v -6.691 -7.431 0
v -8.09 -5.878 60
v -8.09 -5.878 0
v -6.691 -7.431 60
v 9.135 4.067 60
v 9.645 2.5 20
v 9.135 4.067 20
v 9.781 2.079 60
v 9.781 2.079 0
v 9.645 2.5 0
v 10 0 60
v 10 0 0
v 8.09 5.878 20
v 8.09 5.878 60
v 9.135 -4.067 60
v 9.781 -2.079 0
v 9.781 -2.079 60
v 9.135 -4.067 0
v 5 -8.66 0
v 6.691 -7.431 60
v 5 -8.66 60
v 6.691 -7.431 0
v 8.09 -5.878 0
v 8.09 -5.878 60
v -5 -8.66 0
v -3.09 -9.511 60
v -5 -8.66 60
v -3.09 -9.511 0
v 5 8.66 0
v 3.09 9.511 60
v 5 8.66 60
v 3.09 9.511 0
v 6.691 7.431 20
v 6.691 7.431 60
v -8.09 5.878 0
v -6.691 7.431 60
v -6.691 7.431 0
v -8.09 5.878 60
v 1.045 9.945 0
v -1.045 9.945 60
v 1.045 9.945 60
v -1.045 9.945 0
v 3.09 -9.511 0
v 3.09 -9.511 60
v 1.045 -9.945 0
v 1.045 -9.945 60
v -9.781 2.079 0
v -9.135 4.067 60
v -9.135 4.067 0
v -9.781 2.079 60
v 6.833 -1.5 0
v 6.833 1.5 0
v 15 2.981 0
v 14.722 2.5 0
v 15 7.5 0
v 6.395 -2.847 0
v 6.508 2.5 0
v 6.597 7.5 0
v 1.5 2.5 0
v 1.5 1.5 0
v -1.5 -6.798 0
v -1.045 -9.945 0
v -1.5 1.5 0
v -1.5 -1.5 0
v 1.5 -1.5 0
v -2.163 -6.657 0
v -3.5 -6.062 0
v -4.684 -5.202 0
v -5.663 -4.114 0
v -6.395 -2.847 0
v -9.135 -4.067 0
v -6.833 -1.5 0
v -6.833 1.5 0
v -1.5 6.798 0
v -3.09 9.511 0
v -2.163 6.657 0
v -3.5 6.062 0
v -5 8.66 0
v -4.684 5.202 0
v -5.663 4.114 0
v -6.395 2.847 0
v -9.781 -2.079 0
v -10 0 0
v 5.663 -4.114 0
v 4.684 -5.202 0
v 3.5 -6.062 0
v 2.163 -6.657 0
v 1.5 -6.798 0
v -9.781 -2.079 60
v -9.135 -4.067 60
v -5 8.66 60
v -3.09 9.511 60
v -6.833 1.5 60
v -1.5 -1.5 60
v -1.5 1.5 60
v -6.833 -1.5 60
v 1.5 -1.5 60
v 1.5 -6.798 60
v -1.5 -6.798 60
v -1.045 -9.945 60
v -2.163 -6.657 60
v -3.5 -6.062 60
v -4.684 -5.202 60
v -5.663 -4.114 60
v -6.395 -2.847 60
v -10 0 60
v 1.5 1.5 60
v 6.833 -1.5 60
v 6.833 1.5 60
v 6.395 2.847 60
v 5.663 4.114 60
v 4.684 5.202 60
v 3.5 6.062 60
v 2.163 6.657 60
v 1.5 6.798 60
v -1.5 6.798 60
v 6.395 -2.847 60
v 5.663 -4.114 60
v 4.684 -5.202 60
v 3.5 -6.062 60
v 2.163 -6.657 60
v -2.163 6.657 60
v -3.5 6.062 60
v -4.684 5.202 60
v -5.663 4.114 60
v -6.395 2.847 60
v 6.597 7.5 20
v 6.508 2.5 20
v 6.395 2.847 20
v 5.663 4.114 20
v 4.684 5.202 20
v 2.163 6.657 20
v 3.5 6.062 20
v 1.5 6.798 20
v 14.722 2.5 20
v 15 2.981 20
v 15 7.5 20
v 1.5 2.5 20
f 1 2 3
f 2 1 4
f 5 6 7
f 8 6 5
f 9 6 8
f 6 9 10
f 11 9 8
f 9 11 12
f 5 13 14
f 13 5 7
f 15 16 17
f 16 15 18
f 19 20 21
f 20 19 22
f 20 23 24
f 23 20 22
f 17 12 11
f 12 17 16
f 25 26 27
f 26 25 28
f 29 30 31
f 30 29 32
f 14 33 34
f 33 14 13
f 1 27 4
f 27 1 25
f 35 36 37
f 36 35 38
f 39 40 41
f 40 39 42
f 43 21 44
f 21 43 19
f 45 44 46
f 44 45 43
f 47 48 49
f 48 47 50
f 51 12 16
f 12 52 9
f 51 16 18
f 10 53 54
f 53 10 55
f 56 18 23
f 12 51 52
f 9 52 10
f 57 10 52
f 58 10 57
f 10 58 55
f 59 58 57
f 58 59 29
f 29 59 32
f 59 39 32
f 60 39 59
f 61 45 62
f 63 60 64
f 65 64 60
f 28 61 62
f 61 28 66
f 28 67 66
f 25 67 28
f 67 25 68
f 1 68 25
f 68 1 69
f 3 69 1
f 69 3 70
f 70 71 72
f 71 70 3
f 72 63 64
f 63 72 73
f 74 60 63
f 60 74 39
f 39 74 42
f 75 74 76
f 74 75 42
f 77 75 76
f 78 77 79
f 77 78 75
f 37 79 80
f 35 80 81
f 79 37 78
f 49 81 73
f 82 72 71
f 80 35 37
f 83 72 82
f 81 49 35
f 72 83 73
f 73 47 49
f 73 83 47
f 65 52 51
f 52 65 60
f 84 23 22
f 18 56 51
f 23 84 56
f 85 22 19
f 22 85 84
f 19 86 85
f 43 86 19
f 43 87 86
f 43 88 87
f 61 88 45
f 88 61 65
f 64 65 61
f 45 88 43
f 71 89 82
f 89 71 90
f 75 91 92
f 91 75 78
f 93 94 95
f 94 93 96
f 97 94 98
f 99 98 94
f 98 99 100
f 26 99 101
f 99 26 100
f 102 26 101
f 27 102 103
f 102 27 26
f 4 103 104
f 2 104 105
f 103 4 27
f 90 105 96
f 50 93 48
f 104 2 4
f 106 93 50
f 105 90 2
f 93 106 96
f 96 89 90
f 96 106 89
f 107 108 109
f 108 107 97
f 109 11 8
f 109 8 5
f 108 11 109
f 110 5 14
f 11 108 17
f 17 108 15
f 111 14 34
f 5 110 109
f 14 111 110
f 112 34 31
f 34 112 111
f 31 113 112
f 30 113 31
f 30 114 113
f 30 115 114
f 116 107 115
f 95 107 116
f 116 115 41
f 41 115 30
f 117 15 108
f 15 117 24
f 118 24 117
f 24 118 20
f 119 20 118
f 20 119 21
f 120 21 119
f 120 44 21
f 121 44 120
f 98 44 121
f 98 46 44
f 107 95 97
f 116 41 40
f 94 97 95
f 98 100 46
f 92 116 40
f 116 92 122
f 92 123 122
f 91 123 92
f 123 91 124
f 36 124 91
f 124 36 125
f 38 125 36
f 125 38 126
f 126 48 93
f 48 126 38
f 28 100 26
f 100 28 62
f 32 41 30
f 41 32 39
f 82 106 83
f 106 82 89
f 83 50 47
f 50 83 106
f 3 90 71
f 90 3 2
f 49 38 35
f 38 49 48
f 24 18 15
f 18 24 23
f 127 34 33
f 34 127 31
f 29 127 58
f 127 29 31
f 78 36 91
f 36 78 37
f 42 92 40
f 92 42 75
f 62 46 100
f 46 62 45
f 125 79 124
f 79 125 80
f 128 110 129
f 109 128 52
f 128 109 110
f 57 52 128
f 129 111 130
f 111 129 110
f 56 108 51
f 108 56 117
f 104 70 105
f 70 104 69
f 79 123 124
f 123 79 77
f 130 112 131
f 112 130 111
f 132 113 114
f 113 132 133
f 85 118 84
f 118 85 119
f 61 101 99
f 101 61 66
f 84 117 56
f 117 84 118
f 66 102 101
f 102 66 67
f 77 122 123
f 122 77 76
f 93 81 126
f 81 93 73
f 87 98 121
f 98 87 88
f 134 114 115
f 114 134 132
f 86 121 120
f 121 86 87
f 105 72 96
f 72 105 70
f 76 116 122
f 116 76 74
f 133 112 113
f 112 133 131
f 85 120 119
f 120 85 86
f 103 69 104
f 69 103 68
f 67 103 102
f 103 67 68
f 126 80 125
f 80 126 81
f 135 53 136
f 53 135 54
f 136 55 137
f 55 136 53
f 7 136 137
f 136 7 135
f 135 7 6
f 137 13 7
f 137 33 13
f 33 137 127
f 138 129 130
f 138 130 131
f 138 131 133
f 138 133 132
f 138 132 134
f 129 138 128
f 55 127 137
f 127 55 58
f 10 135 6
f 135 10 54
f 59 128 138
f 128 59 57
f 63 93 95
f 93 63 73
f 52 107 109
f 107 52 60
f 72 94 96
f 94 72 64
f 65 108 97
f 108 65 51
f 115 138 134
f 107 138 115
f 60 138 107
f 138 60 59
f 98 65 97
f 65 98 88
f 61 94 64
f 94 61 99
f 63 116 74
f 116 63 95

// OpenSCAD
/* *Label Dispenser*
 *
 * Copyright (C) 2011: Erik/Ultimaker, Elmo Mäntynen
 * GPL 2.1
 */

use <MCAD/regular_shapes.scad>
//use <MCAD/transformations.scad>

// Parameters:
label_width = 29; // This is the most important one
min_dx = 80;
min_height = 63;
drum_dia = 33;
wall_thickness = 4;


// Create a roll holder?
inner_roll_holder = true;
//inner_roll_holder = false;

max_roll_OD = 60;
min_roll_ID = 10;

// Use a roller?
roller = true;
//roller = false;

add_handle = true;

// A switch for orienting and placing for printing or demoing:
mode = "demo";
//mode = "print";


if (mode == "print") {
rotate([90, 0, 0]) dispenser();
} else {
dispenser();
}

dx = inner_roll_holder ? max(max_roll_OD+drum_dia+wall_thickness*2, min_dx) : min_dx;
height = inner_roll_holder ? max(max_roll_OD+drum_dia/2+wall_thickness*2, min_height) : min_height;

width = label_width + wall_thickness*2;
drum_placement = [drum_dia/2,width,height-wall_thickness*3/2-drum_dia/2];
axle_side = sqrt(pow(min_roll_ID-4-0.1, 2)/2);
guard_rotation = 25;


module dispenser()
{
difference()
{
  union()
  {
    intersection()
    {
      drum();
      body();
    }
    ensemble();
  }
  slot(rear=!inner_roll_holder);
  translate([10,wall_thickness,height-wall_thickness*4]) rotate([0,-20,0])
    cube([11,width,wall_thickness*4]);
  roll_guard(mode="negative");
}

if (inner_roll_holder)
{
  //add roll holder
 roll_holder();
 roll_guard();
} else
{
  // add a guide
  rotate([0,8,0]) translate([23,0,height-7])
    cube([dx-31,width,1]);
}

if (add_handle) {
  handle(mode=mode);}

}


plate_offset = [drum_dia/2+drum_placement[0]-wall_thickness, 0, 3];
plate_size = [dx-plate_offset[0], wall_thickness-1, drum_placement[2]];
axle_placement = plate_offset + [plate_size[0]/2, 0, plate_size[2]/2];

module roll_holder(mode=mode)
{

roller_placement = mode == "demo" ? axle_placement :
                   mode == "print"? [min_roll_ID-1, -wall_thickness, height+4-min_roll_ID] :
                   false;

echo(str("Rolls with OD < ", min(plate_size[0], plate_size[2])-wall_thickness*2, " and ID > ",
     min_roll_ID, " should fit"));

union()
{

  translate(plate_offset)
    cube(plate_size);
  translate([0, width/2, 0]) union()
  {
    translate(axle_placement) rotate([0, guard_rotation, 0])
      cube([axle_side, width, axle_side], center=true);
    if (roller != false)
    {
      color([0.5, 1, 0]) translate(roller_placement) rotate([90,0,0])
        cylinder_tube(height=width-2*wall_thickness, radius=min_roll_ID/2,
                      wall=2, center=true, $fn=50);
    }
  }
}
}

module roll_guard(mode=mode, thickness=wall_thickness/2, rotation = guard_rotation)
{
  scale = mode == "negative" ? [1.0, 5, 1] : [1, 1, 1];
  mode = mode == "negative" ? "demo" : mode;
  placement = mode == "demo" ? axle_placement + [0, width-wall_thickness, 0]:
              mode == "print"? [0, 0, height-10-min_roll_ID] :
              [0, 0, 0];

  rotation = mode == "demo" ? rotation : 100;

  translate(placement + [0, scale[1]*thickness/2, 0])
    scale(scale)  rotate([90, rotation, 0]) difference()
    {
      color([0.1, 0.3, 0]) union()
      {
        cube([plate_size[0]*1.25, thickness, thickness], center=true);
        cylinder(r=min_roll_ID, h=thickness, center=true);
      }
      cube([axle_side, axle_side, thickness*2], center=true);
    }
}

module interfaceShape(len, t, w) {
	difference(){
		translate([0, t/2, 0]) cube([w, t, len]);
		for (rot=[0, 180]){
			rotate(rot, [0, 1, 0]) rotate(-30, [0,0,1]) translate([11.5,5,0]) cube([15,30,len+10]);
		}
	}
}

module interfaceSlot(len, magr=false, magt=false, neg=false){
	// You can import this to implement this interface in your gadget/mount

	// If neg==true, export the shape suitable for subtracting to make female slot
	// If neg==false (default), gives a shape add for mating with a female slot
	// See finalWristmount for an example use

	// These dimensions are suggestions. Good dimensions to be determined and standardised on
	t=5;	//thickness
	w=15;	//width of the bottom
	//deg=30 hardcoded for now

	//module magnetSlot(){translate([0, t-magt, 0]) rotate(-90, [1, 0, 0]) cylinder(magt*2, r=magr);}

	if (neg){
		union(){
			interfaceShape(len, t, w);
			//magnetSlot();
		}
	}
	if (!neg) {
		scale([-999/100]) difference(){
			interfaceShape(len, t, w);
			//magnetSlot();
		}
	}
}

handle_dia = 20;
handle_lenght =  60;

module handle(mode="demo")
{
!union()
{
  cylinder_tube(height=handle_lenght, radius=handle_dia/2, wall=3);
  interfaceSlot(len=handle_dia);
  intersection() {
    cylinder(h=handle_lenght, r=handle_dia/2);
    union() {
      cube([handle_dia, 3, handle_lenght*3], center=true);
      #cube([3, handle_dia, handle_lenght*3], center=true);
    }
  }
}
}

module drum()
{
  difference()
  {

    drum_part(diameter=drum_dia-4,width=width-wall_thickness);
    translate([0,wall_thickness,0])
      drum_part(diameter=drum_dia-10);
  }
}

module ensemble()
{
union()
{
  difference()
  {
  body();
  translate([0,wall_thickness,0])
    drum_part();

  cutout();
  }
  difference()
  {
    intersection()
    {
      body();
      drum_part(diameter=drum_dia+(wall_thickness)*2);
    }
    translate([0,0.1,0])
      drum_part(width=width-wall_thickness);

  }
  foot(dx,width,3);

}

}

module drum_part(diameter=drum_dia, width=width)
{
translate(drum_placement) rotate([90,0,0])
  cylinder(r=diameter/2,h=width);
}

function scaling_factor(dimension) = (dimension-wall_thickness*2)/dimension;

module cutout()
{
reference = [dx/2, width/2, height/2];
translate([wall_thickness,-0.1,wall_thickness])
//translate(reference)
//scale([scaling_factor(dx),1.2,scaling_factor(width)])
  //translate(-reference)
  body(scaling_factor(dx)*dx, 1.2*width, scaling_factor(height)*height);
}

module body(dx=dx, width=width, height=height)
{
intersection()
{
cube([dx,width,height]);
rotate([0,15,0]) cube([dx*2,width,height*2]);
}
}

module slot(rear=true)
{
rotate([0,12,0]) translate([-dx/2,wall_thickness,height-wall_thickness+3]) cube([dx,label_width,1]);
if (rear == true)
{
  translate([dx-30/2,wall_thickness,height-16]) cube([30,label_width,4]);
}
}

module foot(l,w,h)
{
  translate([-1,0,0]) cube([l+3,w,h]);
}
